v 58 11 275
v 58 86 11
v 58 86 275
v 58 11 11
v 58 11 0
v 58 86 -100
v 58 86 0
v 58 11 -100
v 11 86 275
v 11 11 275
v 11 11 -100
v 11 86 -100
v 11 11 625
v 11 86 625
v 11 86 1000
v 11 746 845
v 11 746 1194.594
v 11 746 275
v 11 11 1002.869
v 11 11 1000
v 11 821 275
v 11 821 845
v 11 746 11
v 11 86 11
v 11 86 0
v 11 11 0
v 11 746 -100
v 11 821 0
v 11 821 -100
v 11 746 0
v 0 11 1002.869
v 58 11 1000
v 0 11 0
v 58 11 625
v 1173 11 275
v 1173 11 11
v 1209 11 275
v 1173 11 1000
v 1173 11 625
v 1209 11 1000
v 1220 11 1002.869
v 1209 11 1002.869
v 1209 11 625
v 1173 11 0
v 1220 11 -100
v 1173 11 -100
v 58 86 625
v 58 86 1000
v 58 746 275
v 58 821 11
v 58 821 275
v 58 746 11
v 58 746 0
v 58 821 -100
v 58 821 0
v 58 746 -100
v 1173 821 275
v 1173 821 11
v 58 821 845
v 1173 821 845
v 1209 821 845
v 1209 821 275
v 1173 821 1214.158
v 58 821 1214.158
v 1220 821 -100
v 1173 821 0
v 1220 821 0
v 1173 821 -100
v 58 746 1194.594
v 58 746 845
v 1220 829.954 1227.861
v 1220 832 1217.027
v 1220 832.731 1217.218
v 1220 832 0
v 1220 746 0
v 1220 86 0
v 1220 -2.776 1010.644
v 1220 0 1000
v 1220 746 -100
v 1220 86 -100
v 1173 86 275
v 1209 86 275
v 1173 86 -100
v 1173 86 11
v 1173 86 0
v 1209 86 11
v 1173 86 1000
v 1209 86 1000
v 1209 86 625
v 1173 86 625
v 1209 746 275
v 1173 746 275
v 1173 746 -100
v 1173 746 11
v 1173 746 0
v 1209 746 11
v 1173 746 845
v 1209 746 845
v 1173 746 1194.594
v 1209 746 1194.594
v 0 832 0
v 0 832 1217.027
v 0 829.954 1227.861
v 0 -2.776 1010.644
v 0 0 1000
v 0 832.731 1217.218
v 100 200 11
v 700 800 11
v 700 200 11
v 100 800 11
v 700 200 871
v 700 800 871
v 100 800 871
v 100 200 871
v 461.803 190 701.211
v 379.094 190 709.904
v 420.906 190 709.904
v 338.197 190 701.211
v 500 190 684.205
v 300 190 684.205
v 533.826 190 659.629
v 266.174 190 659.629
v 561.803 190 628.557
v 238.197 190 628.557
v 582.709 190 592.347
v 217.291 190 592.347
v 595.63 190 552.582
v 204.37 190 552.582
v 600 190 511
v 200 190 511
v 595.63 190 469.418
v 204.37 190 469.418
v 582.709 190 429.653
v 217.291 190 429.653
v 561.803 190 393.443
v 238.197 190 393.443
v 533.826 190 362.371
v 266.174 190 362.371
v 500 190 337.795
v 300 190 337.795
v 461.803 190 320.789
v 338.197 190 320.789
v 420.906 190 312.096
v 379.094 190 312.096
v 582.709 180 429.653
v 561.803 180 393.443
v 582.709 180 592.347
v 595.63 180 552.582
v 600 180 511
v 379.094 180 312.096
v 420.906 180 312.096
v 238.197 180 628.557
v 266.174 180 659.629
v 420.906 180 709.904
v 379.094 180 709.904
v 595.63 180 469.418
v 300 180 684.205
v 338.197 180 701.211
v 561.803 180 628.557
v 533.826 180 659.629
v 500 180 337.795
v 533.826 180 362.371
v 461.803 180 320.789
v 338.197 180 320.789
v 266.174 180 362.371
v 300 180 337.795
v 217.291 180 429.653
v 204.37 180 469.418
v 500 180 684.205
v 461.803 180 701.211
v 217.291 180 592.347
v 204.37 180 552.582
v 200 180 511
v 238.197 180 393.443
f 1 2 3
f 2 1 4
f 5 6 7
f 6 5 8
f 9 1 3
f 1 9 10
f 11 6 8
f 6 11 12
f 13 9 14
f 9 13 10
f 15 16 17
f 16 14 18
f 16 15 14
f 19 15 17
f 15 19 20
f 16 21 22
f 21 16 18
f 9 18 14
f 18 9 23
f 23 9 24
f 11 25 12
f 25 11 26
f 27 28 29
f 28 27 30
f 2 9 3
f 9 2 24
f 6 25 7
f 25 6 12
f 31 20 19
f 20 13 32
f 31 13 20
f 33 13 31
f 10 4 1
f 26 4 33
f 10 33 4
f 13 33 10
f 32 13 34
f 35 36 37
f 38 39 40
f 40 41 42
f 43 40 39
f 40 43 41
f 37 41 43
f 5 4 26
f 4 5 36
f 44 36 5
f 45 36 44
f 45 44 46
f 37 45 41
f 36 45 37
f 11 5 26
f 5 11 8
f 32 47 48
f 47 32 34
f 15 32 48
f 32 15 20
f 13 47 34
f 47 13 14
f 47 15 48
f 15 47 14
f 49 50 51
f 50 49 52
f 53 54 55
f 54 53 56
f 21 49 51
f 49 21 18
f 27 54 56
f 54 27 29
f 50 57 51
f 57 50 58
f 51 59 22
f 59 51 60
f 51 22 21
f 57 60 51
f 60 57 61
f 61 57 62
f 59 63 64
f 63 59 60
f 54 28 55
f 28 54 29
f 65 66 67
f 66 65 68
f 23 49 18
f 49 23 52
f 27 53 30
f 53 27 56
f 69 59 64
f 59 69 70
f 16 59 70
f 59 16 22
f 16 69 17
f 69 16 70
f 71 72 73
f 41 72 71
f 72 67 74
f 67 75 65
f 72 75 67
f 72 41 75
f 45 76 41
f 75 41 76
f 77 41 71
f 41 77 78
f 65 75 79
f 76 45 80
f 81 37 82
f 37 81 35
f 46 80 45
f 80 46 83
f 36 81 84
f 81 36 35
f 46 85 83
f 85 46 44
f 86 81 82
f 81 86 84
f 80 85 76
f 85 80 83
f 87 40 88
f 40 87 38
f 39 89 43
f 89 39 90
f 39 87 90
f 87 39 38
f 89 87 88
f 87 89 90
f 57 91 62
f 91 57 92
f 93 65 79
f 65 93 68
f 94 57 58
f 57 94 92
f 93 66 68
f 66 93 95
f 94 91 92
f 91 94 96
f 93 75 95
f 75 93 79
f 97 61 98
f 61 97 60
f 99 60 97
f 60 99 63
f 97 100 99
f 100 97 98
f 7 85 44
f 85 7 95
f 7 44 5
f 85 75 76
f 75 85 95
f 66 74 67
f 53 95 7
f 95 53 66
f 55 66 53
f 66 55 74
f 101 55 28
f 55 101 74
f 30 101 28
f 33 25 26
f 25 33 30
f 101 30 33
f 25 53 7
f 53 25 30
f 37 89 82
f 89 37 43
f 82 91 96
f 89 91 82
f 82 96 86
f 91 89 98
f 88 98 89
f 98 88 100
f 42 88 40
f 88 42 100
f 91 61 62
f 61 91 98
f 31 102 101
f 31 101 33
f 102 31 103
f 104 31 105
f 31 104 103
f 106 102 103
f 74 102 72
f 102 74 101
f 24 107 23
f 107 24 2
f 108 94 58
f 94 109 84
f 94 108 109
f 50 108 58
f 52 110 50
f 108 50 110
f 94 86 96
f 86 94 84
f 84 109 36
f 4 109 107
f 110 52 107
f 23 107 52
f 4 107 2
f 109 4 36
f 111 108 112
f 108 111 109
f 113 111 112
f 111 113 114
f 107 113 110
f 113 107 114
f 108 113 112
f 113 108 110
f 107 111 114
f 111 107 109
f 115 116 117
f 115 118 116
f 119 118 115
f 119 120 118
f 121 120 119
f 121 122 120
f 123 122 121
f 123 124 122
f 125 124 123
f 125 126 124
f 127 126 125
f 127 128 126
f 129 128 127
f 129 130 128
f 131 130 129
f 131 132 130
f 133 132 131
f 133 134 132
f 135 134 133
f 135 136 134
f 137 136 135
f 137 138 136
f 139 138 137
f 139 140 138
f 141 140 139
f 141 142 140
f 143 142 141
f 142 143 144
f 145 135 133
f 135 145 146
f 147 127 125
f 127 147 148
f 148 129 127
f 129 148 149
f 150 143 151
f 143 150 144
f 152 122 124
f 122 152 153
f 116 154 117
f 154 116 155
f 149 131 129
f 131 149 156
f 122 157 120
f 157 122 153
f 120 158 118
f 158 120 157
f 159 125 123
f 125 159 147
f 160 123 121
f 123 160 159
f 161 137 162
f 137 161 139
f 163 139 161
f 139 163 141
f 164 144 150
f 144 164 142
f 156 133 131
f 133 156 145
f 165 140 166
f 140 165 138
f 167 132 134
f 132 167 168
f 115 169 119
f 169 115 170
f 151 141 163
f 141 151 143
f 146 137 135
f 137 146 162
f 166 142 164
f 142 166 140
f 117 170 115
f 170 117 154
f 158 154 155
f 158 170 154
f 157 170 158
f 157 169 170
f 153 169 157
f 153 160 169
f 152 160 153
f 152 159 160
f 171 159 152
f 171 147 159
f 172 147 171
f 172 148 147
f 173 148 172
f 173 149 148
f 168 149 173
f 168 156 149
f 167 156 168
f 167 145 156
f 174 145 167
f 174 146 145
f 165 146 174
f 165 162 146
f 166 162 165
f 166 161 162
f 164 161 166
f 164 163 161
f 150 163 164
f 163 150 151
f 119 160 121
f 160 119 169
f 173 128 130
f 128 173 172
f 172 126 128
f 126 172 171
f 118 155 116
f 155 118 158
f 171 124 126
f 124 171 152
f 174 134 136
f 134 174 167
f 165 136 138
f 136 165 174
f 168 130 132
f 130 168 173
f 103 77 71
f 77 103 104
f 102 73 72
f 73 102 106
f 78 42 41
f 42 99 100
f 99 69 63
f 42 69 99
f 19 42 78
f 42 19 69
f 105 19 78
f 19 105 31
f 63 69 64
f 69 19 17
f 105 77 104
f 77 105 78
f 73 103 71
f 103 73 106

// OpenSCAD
/*
for(z=[0:8]) {
	translate([
		0,
		-14.5,
		110*z
	]) {
		cube([1200, 14.5, 119]);
	}
	echo("cladding 1200");
}
for(z=[0:10]) {
	translate([
		0,
		900,
		110*z
	]) {
		cube([1200, 14.5, 119]);
	}
	echo("cladding 1200");
}
for(x=[0:1]) {
	for(z=[0:10]) {
		translate([
			(1200-14.5)*x,
			0,
			110*z
		]) {
			cube([14.5,900, 119]);
		}
		echo("cladding 900");
	}
}

for(x=[0:2]) {
	translate([
		14.5+ (1200-47-14.5*2)/2*x,
		47,
		0
	]) {
		cube([47, 900-47*2, 75]);
		echo("wood" , 900-47*2);
	}
}
for(y=[0:1]) {
	translate([
		47+14.5,
		(900-47)/1*y,
		0
	]) {
		cube([1200-47*2-14.5*2, 47, 75]);
		echo("wood", 1200-47*2-14.5*2);
	}
}
//Upright
for(x=[0:1]) {
	for(y=[0:1]) {
		translate([
			14.5+(1200-47-14.5*2)*x,
			(900-75)*y,
			-50
		]) {
			cube([47, 75, 1050 + 220*y]);
			echo("wood", 1050 + 220*y);
		}
	}
}
*/


difference() {
	union() {
		*cube([1220,11,1000]);
		translate([1220-11,11,0]) cube([11,810,1220]);
		translate([0,810+11,0]) cube([1220,11,1220]);
		translate([0,11,0]) cube([11,810,1220]);
		translate([11,11,0]) cube([1220-11*2,810,11]);
		for(x=[0:1]) {
			for(y=[0:1]) {
				translate([
					11+(1220-11-47)*x,
					11+(810-75)*y,
					-100
				]) {
					cube([47, 75, 375]);
					echo("wood", 375);
				}
					translate([
					11+(1220-11-47)*x,
					11+(810-75)*y,
					1000-375 + 220*y
				]) {
					cube([47, 75, 375]);
					echo("wood", 375);
				}
			}
		}
	}
	translate([-10,0,1000]) rotate([asin(210/(810+11*2)),0,0]) cube(10000);
	
}
translate([0,0,1000]) rotate([asin(210/(810+11*2)),0,0]) cube([1220,sqrt(pow(810+11*2,2)+pow(220,2)),11]);
echo("Roof", sqrt(pow(810+11,2)+pow(220,2)));


translate([
	100,
	200,
	11
]) {
	//Dryer
	color([1, 1, 1]) cube([
		600,
		600,
		860
	]);
	color([0, 0, 0]) translate([300, -10, 500]) rotate([90, 0, 0]) cylinder(r=200, h=10);
}
